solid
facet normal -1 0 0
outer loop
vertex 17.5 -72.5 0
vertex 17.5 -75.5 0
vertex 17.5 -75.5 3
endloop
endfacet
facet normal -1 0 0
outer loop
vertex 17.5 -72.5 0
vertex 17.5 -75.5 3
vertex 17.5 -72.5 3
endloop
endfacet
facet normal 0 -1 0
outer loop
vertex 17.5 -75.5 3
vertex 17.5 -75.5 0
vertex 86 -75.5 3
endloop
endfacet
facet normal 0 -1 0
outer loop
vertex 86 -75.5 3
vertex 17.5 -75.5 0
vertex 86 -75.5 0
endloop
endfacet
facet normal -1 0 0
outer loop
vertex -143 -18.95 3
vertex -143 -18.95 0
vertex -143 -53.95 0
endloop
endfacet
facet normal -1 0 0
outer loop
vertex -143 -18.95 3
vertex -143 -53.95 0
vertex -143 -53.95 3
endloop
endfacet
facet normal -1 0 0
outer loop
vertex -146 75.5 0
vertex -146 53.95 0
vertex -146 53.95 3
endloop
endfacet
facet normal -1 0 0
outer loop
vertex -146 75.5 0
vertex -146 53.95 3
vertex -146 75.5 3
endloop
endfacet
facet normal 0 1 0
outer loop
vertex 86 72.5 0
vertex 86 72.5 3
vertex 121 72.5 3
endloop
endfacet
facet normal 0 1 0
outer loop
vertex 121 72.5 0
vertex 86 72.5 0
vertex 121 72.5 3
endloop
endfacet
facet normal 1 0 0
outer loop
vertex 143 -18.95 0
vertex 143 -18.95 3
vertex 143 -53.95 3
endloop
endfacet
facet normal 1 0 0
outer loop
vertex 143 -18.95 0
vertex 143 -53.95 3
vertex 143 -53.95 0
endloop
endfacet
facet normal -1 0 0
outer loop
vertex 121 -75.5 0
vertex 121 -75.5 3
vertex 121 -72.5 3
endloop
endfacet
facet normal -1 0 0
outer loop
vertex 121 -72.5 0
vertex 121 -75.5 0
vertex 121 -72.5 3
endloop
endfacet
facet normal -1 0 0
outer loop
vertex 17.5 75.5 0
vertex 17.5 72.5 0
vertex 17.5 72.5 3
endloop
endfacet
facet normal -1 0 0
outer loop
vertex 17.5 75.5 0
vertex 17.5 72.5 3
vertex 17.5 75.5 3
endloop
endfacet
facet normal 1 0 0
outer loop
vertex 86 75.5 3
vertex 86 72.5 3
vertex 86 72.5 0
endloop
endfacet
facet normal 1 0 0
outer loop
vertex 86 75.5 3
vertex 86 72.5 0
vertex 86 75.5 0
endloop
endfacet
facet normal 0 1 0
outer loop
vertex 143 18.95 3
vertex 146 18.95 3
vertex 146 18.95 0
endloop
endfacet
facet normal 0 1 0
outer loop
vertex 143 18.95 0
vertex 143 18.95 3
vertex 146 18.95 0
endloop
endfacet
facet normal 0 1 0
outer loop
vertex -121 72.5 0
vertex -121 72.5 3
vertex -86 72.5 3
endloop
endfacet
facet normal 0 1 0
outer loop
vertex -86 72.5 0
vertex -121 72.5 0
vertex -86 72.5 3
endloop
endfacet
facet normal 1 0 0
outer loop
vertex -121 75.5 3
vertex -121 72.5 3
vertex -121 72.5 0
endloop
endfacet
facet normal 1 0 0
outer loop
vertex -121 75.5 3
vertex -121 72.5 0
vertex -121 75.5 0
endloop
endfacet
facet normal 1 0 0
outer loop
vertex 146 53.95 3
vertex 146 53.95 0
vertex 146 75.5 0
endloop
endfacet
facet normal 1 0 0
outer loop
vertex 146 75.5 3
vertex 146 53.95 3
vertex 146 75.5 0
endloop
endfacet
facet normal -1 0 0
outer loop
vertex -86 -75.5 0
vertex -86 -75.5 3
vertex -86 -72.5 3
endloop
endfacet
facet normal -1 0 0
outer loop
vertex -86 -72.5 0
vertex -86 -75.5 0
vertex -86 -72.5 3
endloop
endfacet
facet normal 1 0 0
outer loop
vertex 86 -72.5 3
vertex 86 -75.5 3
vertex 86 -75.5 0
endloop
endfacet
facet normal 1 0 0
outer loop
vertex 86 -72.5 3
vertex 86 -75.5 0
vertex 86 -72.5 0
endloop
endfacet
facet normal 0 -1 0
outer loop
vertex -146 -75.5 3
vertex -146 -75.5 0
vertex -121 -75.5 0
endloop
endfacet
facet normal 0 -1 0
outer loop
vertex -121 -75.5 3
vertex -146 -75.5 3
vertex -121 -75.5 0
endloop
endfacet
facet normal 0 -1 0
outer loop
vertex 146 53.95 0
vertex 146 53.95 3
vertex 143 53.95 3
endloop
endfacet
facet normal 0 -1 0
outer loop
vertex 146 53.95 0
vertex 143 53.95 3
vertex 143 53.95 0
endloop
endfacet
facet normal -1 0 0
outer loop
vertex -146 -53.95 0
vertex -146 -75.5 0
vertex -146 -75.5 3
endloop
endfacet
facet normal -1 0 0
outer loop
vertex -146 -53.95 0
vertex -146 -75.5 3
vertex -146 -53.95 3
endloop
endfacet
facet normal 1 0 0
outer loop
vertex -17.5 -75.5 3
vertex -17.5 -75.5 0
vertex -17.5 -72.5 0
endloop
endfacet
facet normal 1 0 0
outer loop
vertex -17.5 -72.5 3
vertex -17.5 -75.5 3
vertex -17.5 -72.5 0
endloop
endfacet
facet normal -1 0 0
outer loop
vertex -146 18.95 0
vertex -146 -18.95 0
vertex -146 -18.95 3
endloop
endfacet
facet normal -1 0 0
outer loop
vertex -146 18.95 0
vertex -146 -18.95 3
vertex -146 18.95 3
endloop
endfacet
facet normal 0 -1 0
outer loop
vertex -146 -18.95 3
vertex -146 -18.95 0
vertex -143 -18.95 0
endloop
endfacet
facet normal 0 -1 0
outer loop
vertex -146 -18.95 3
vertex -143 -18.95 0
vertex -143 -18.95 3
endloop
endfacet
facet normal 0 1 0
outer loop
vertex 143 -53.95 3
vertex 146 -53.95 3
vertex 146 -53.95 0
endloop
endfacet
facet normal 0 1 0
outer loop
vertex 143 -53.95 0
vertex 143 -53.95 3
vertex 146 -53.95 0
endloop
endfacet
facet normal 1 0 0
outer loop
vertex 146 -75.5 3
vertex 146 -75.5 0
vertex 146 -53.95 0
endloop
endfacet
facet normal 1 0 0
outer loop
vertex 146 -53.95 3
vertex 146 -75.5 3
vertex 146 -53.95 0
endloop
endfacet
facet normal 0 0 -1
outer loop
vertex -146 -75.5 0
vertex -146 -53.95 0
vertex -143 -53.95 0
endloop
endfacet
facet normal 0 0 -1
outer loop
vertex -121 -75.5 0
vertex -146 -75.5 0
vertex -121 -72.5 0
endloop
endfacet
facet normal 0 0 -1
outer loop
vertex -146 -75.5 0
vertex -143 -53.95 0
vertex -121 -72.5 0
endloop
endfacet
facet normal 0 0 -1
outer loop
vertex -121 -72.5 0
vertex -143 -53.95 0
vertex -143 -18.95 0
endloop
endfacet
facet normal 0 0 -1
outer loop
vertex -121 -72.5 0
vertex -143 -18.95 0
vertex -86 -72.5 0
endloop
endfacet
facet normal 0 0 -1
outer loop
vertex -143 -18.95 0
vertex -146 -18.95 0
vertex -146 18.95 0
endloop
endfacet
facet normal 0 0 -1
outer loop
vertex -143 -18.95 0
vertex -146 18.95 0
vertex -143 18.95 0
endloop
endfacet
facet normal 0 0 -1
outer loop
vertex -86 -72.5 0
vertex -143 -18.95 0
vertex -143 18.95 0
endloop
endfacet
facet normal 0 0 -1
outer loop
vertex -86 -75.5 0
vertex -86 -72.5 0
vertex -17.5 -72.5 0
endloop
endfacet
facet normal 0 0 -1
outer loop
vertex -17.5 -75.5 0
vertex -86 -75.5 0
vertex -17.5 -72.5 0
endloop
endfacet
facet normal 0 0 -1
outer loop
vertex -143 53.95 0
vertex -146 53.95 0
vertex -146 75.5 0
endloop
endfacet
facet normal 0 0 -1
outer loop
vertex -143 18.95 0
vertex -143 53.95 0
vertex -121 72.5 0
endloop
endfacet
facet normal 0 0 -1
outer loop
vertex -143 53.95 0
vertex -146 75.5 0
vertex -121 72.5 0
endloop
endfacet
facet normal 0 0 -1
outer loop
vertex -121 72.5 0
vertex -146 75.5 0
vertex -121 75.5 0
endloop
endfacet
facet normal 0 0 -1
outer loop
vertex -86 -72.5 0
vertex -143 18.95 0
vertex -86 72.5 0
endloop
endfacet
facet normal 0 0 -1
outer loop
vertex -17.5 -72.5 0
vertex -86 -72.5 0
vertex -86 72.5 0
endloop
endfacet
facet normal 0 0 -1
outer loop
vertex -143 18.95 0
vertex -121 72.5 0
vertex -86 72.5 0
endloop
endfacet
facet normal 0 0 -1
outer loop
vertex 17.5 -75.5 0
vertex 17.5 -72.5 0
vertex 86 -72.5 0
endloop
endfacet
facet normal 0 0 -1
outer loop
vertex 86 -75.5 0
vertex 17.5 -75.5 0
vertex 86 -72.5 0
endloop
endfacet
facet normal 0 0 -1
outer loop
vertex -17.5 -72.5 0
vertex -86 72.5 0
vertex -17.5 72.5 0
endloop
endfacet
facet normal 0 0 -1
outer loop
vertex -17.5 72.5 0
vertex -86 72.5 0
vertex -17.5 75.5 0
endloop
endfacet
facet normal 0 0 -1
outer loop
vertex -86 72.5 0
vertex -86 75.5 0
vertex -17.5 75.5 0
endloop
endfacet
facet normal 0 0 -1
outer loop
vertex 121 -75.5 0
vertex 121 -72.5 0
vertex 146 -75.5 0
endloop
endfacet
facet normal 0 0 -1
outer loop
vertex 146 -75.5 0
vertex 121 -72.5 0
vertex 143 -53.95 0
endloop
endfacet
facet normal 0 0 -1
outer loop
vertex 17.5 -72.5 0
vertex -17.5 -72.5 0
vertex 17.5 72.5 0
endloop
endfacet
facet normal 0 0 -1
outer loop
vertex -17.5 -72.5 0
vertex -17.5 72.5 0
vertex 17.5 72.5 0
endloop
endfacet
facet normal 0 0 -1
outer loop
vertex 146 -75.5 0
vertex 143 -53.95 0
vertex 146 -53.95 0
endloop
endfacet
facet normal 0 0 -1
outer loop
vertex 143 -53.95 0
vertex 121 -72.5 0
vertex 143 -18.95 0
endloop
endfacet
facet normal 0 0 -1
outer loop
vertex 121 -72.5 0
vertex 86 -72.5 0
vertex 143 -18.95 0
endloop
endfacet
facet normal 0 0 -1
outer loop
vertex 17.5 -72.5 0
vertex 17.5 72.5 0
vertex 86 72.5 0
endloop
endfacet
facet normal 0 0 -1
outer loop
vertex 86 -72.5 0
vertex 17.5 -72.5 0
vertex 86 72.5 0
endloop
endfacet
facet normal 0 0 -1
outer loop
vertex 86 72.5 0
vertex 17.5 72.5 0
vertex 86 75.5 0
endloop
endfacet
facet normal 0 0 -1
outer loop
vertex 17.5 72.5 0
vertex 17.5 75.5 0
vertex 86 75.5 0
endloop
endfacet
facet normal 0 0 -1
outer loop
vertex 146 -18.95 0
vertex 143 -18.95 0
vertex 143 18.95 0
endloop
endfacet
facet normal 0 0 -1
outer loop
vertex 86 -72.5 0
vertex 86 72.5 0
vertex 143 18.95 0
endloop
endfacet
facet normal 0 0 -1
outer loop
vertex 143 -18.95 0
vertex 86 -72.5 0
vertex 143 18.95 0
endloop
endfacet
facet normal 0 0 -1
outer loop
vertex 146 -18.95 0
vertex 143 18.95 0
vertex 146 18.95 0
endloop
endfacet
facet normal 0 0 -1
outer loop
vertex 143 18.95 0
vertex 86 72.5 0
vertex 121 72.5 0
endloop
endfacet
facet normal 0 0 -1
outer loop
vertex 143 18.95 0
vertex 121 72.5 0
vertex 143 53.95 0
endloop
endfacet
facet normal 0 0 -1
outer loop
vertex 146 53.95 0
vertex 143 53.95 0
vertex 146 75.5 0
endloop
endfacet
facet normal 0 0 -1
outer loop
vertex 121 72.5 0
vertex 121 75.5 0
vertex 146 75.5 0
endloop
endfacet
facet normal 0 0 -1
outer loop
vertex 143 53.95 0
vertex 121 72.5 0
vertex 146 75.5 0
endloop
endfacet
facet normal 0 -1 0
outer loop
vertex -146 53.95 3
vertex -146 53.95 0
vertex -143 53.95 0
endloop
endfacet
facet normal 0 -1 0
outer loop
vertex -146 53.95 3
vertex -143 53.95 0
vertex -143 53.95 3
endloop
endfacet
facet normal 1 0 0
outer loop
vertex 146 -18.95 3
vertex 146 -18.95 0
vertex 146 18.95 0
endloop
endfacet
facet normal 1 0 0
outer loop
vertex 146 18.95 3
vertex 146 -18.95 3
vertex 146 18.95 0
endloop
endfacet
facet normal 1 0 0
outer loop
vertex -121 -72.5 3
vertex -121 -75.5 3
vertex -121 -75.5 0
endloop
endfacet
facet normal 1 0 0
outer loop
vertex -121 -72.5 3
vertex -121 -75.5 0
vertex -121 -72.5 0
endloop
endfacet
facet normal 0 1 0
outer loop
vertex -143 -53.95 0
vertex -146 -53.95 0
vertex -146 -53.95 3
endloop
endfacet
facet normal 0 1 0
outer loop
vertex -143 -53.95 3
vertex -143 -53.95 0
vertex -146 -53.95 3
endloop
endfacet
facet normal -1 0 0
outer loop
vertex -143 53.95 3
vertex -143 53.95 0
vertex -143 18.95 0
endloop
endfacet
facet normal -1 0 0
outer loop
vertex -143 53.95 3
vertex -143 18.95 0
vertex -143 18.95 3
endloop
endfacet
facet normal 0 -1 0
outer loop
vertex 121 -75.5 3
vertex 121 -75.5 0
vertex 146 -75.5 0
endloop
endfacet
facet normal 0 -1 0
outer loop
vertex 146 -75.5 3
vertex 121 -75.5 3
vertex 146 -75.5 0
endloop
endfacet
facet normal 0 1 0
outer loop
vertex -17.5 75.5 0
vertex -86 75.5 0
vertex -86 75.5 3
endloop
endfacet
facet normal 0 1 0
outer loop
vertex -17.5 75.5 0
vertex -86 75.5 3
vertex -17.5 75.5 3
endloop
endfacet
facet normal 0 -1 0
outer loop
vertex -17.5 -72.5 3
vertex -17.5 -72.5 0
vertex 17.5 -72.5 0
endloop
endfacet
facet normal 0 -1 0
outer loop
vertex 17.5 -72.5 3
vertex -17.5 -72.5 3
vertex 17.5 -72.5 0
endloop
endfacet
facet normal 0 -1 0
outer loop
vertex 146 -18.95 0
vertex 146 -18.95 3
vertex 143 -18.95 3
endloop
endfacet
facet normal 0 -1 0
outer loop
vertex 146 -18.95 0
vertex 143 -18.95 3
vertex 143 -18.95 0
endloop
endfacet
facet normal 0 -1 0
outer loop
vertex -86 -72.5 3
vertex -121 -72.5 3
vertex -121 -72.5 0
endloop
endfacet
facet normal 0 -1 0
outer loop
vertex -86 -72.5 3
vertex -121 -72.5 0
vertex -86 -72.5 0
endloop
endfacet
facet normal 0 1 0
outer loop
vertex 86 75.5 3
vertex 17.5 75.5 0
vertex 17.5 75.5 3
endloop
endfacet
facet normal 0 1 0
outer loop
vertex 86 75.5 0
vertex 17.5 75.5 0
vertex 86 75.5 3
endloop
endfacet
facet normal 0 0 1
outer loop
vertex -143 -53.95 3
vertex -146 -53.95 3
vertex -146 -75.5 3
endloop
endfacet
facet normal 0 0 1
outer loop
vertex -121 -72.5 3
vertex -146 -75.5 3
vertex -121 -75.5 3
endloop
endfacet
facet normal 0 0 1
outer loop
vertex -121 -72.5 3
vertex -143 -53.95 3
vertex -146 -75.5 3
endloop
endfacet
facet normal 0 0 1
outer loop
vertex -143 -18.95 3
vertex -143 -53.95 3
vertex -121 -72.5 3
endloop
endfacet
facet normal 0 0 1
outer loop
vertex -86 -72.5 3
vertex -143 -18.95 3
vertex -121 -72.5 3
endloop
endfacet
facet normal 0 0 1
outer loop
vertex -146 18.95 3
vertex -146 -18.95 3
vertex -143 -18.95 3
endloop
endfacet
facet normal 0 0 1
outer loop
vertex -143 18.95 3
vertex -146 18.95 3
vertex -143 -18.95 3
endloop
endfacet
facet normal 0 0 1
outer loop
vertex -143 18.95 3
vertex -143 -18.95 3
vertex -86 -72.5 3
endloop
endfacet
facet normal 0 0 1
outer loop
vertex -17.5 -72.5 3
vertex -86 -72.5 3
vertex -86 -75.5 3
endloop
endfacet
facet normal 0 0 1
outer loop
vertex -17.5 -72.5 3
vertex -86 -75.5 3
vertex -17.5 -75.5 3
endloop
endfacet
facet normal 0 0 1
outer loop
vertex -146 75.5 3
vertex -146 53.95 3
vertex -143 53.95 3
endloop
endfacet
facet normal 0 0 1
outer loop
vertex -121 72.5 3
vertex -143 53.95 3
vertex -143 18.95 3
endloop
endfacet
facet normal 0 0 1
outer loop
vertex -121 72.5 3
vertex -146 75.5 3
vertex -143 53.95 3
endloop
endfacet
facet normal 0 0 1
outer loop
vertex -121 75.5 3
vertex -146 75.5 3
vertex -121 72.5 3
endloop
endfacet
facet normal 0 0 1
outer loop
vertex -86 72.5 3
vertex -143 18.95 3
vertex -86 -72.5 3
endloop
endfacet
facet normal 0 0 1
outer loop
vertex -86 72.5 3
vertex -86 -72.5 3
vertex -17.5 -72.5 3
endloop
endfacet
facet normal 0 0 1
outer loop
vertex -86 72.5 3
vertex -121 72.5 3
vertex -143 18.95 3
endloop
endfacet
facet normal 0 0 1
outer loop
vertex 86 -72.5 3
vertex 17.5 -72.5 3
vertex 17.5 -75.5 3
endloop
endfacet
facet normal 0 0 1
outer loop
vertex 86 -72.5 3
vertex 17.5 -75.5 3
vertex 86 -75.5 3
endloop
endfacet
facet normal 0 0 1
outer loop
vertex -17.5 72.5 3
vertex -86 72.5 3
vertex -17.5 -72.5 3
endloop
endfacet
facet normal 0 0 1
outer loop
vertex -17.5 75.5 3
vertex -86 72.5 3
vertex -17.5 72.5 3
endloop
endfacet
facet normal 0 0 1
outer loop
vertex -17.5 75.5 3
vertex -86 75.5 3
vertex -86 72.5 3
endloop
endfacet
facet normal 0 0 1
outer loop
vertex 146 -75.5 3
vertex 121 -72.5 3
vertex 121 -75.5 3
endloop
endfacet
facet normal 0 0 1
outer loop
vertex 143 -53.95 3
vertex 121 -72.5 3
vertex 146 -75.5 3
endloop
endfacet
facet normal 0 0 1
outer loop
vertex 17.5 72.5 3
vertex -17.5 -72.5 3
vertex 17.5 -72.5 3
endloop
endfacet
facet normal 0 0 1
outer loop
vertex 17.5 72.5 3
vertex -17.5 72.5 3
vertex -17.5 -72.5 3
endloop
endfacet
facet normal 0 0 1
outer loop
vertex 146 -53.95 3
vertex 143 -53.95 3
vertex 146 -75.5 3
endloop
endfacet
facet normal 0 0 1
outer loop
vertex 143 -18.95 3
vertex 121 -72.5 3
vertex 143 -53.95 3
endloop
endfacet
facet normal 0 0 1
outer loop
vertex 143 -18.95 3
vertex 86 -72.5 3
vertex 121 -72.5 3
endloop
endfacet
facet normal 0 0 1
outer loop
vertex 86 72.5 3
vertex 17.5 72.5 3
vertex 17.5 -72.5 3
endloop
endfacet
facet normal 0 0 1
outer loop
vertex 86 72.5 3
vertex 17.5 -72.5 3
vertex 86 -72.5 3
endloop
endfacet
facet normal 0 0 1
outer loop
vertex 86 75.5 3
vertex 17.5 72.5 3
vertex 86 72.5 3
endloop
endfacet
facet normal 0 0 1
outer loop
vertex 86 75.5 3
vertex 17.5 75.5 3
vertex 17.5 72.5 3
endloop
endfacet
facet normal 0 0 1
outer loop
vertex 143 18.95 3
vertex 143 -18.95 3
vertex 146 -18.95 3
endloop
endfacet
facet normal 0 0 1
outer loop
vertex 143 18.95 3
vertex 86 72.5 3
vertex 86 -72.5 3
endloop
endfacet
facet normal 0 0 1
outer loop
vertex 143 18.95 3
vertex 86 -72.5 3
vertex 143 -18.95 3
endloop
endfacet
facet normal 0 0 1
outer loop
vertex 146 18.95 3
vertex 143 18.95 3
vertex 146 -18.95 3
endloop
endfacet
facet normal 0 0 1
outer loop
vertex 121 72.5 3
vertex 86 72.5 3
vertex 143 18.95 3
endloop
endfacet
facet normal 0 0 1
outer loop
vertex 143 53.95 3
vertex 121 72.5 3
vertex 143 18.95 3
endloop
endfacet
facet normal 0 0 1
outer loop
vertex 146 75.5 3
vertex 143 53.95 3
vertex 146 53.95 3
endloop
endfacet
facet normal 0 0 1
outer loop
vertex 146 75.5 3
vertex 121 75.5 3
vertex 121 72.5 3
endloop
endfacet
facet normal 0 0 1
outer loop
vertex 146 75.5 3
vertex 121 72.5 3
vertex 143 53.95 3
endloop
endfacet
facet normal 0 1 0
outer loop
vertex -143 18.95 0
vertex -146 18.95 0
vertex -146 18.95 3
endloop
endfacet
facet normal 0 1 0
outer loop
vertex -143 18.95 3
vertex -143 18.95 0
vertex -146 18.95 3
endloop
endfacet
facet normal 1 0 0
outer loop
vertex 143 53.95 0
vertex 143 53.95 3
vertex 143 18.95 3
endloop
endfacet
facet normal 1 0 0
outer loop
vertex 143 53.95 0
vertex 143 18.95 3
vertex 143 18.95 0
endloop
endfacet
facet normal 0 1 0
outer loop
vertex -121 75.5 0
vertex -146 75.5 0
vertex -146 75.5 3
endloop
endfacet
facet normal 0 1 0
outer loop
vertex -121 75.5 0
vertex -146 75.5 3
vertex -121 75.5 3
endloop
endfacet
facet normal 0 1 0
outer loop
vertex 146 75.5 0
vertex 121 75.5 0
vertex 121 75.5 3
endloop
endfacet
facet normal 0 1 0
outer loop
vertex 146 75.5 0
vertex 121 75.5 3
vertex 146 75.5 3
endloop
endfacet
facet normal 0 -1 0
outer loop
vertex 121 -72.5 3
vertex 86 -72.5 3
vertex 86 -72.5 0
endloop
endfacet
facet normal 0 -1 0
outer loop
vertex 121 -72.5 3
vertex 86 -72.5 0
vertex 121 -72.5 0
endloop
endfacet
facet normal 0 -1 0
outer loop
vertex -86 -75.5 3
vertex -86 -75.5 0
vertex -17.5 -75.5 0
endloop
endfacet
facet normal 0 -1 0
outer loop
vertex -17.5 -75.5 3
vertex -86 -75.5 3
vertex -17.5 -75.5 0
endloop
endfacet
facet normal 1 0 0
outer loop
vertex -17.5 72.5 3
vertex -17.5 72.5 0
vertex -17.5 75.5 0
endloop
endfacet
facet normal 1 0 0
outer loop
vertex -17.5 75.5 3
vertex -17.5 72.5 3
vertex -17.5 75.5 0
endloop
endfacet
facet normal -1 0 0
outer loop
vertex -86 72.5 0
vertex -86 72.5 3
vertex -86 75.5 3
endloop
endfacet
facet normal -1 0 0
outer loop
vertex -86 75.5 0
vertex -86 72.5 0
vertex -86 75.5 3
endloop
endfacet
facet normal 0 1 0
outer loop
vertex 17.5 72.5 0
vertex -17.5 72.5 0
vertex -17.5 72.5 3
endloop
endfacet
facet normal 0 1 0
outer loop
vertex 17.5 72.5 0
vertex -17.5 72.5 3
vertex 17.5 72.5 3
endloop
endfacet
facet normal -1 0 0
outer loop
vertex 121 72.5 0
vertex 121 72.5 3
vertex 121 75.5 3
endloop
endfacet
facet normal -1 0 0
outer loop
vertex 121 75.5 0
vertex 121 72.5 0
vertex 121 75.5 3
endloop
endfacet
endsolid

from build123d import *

# Parameters (mm, degrees)
SKETCH1_W           = 292
SKETCH1_H           = 151
BOSS_EXTRUDE1_DEPTH = 3
SKETCH2_W           = 35
SKETCH2_H           = 3
CUT_EXTRUDE1_DEPTH  = 3
SKETCH4_W           = 35
SKETCH4_H           = 3
CUT_EXTRUDE2_DEPTH  = 3
SKETCH5_W           = 3
SKETCH5_H           = 35
CUT_EXTRUDE3_DEPTH  = 3
SKETCH7_W           = 3
SKETCH7_H           = 35
CUT_EXTRUDE4_DEPTH  = 3


with BuildPart() as part:
    # Sketch1 → Boss-Extrude1 (new body)
    with BuildSketch(Plane.XY):
        Rectangle(SKETCH1_W, SKETCH1_H)
    extrude(amount=BOSS_EXTRUDE1_DEPTH)

    # Sketch2 → Cut-Extrude1 (cut)
    with BuildSketch(Plane.XY.offset(3)):
        with Locations((103.5, 74)):
            Rectangle(SKETCH2_W, SKETCH2_H)
        with Locations((-103.5, 74)):
            Rectangle(SKETCH2_W, SKETCH2_H)
        with Locations((-103.5, -74)):
            Rectangle(SKETCH2_W, SKETCH2_H)
        with Locations((103.5, -74)):
            Rectangle(SKETCH2_W, SKETCH2_H)
    extrude(amount=-CUT_EXTRUDE1_DEPTH, mode=Mode.SUBTRACT)

    # Sketch4 → Cut-Extrude2 (cut)
    with BuildSketch(Plane.XY):
        with Locations((0, -74)):
            Rectangle(SKETCH4_W, SKETCH4_H)
        with Locations((0, 74)):
            Rectangle(SKETCH4_W, SKETCH4_H)
    extrude(amount=CUT_EXTRUDE2_DEPTH, mode=Mode.SUBTRACT)

    # Sketch5 → Cut-Extrude3 (cut)
    with BuildSketch(Plane(origin=(146, 0, 0), x_dir=(0, 0, -1), z_dir=(1, 0, 0))):
        with Locations((-1.5, -36.45)):
            Rectangle(SKETCH5_W, SKETCH5_H)
        with Locations((-1.5, 36.45)):
            Rectangle(SKETCH5_W, SKETCH5_H)
    extrude(amount=-CUT_EXTRUDE3_DEPTH, mode=Mode.SUBTRACT)

    # Sketch7 → Cut-Extrude4 (cut)
    with BuildSketch(Plane.ZY.offset(146)):
        with Locations((1.5, -36.45)):
            Rectangle(SKETCH7_W, SKETCH7_H)
        with Locations((1.5, 36.45)):
            Rectangle(SKETCH7_W, SKETCH7_H)
    extrude(amount=-CUT_EXTRUDE4_DEPTH, mode=Mode.SUBTRACT)


solid = part.part
